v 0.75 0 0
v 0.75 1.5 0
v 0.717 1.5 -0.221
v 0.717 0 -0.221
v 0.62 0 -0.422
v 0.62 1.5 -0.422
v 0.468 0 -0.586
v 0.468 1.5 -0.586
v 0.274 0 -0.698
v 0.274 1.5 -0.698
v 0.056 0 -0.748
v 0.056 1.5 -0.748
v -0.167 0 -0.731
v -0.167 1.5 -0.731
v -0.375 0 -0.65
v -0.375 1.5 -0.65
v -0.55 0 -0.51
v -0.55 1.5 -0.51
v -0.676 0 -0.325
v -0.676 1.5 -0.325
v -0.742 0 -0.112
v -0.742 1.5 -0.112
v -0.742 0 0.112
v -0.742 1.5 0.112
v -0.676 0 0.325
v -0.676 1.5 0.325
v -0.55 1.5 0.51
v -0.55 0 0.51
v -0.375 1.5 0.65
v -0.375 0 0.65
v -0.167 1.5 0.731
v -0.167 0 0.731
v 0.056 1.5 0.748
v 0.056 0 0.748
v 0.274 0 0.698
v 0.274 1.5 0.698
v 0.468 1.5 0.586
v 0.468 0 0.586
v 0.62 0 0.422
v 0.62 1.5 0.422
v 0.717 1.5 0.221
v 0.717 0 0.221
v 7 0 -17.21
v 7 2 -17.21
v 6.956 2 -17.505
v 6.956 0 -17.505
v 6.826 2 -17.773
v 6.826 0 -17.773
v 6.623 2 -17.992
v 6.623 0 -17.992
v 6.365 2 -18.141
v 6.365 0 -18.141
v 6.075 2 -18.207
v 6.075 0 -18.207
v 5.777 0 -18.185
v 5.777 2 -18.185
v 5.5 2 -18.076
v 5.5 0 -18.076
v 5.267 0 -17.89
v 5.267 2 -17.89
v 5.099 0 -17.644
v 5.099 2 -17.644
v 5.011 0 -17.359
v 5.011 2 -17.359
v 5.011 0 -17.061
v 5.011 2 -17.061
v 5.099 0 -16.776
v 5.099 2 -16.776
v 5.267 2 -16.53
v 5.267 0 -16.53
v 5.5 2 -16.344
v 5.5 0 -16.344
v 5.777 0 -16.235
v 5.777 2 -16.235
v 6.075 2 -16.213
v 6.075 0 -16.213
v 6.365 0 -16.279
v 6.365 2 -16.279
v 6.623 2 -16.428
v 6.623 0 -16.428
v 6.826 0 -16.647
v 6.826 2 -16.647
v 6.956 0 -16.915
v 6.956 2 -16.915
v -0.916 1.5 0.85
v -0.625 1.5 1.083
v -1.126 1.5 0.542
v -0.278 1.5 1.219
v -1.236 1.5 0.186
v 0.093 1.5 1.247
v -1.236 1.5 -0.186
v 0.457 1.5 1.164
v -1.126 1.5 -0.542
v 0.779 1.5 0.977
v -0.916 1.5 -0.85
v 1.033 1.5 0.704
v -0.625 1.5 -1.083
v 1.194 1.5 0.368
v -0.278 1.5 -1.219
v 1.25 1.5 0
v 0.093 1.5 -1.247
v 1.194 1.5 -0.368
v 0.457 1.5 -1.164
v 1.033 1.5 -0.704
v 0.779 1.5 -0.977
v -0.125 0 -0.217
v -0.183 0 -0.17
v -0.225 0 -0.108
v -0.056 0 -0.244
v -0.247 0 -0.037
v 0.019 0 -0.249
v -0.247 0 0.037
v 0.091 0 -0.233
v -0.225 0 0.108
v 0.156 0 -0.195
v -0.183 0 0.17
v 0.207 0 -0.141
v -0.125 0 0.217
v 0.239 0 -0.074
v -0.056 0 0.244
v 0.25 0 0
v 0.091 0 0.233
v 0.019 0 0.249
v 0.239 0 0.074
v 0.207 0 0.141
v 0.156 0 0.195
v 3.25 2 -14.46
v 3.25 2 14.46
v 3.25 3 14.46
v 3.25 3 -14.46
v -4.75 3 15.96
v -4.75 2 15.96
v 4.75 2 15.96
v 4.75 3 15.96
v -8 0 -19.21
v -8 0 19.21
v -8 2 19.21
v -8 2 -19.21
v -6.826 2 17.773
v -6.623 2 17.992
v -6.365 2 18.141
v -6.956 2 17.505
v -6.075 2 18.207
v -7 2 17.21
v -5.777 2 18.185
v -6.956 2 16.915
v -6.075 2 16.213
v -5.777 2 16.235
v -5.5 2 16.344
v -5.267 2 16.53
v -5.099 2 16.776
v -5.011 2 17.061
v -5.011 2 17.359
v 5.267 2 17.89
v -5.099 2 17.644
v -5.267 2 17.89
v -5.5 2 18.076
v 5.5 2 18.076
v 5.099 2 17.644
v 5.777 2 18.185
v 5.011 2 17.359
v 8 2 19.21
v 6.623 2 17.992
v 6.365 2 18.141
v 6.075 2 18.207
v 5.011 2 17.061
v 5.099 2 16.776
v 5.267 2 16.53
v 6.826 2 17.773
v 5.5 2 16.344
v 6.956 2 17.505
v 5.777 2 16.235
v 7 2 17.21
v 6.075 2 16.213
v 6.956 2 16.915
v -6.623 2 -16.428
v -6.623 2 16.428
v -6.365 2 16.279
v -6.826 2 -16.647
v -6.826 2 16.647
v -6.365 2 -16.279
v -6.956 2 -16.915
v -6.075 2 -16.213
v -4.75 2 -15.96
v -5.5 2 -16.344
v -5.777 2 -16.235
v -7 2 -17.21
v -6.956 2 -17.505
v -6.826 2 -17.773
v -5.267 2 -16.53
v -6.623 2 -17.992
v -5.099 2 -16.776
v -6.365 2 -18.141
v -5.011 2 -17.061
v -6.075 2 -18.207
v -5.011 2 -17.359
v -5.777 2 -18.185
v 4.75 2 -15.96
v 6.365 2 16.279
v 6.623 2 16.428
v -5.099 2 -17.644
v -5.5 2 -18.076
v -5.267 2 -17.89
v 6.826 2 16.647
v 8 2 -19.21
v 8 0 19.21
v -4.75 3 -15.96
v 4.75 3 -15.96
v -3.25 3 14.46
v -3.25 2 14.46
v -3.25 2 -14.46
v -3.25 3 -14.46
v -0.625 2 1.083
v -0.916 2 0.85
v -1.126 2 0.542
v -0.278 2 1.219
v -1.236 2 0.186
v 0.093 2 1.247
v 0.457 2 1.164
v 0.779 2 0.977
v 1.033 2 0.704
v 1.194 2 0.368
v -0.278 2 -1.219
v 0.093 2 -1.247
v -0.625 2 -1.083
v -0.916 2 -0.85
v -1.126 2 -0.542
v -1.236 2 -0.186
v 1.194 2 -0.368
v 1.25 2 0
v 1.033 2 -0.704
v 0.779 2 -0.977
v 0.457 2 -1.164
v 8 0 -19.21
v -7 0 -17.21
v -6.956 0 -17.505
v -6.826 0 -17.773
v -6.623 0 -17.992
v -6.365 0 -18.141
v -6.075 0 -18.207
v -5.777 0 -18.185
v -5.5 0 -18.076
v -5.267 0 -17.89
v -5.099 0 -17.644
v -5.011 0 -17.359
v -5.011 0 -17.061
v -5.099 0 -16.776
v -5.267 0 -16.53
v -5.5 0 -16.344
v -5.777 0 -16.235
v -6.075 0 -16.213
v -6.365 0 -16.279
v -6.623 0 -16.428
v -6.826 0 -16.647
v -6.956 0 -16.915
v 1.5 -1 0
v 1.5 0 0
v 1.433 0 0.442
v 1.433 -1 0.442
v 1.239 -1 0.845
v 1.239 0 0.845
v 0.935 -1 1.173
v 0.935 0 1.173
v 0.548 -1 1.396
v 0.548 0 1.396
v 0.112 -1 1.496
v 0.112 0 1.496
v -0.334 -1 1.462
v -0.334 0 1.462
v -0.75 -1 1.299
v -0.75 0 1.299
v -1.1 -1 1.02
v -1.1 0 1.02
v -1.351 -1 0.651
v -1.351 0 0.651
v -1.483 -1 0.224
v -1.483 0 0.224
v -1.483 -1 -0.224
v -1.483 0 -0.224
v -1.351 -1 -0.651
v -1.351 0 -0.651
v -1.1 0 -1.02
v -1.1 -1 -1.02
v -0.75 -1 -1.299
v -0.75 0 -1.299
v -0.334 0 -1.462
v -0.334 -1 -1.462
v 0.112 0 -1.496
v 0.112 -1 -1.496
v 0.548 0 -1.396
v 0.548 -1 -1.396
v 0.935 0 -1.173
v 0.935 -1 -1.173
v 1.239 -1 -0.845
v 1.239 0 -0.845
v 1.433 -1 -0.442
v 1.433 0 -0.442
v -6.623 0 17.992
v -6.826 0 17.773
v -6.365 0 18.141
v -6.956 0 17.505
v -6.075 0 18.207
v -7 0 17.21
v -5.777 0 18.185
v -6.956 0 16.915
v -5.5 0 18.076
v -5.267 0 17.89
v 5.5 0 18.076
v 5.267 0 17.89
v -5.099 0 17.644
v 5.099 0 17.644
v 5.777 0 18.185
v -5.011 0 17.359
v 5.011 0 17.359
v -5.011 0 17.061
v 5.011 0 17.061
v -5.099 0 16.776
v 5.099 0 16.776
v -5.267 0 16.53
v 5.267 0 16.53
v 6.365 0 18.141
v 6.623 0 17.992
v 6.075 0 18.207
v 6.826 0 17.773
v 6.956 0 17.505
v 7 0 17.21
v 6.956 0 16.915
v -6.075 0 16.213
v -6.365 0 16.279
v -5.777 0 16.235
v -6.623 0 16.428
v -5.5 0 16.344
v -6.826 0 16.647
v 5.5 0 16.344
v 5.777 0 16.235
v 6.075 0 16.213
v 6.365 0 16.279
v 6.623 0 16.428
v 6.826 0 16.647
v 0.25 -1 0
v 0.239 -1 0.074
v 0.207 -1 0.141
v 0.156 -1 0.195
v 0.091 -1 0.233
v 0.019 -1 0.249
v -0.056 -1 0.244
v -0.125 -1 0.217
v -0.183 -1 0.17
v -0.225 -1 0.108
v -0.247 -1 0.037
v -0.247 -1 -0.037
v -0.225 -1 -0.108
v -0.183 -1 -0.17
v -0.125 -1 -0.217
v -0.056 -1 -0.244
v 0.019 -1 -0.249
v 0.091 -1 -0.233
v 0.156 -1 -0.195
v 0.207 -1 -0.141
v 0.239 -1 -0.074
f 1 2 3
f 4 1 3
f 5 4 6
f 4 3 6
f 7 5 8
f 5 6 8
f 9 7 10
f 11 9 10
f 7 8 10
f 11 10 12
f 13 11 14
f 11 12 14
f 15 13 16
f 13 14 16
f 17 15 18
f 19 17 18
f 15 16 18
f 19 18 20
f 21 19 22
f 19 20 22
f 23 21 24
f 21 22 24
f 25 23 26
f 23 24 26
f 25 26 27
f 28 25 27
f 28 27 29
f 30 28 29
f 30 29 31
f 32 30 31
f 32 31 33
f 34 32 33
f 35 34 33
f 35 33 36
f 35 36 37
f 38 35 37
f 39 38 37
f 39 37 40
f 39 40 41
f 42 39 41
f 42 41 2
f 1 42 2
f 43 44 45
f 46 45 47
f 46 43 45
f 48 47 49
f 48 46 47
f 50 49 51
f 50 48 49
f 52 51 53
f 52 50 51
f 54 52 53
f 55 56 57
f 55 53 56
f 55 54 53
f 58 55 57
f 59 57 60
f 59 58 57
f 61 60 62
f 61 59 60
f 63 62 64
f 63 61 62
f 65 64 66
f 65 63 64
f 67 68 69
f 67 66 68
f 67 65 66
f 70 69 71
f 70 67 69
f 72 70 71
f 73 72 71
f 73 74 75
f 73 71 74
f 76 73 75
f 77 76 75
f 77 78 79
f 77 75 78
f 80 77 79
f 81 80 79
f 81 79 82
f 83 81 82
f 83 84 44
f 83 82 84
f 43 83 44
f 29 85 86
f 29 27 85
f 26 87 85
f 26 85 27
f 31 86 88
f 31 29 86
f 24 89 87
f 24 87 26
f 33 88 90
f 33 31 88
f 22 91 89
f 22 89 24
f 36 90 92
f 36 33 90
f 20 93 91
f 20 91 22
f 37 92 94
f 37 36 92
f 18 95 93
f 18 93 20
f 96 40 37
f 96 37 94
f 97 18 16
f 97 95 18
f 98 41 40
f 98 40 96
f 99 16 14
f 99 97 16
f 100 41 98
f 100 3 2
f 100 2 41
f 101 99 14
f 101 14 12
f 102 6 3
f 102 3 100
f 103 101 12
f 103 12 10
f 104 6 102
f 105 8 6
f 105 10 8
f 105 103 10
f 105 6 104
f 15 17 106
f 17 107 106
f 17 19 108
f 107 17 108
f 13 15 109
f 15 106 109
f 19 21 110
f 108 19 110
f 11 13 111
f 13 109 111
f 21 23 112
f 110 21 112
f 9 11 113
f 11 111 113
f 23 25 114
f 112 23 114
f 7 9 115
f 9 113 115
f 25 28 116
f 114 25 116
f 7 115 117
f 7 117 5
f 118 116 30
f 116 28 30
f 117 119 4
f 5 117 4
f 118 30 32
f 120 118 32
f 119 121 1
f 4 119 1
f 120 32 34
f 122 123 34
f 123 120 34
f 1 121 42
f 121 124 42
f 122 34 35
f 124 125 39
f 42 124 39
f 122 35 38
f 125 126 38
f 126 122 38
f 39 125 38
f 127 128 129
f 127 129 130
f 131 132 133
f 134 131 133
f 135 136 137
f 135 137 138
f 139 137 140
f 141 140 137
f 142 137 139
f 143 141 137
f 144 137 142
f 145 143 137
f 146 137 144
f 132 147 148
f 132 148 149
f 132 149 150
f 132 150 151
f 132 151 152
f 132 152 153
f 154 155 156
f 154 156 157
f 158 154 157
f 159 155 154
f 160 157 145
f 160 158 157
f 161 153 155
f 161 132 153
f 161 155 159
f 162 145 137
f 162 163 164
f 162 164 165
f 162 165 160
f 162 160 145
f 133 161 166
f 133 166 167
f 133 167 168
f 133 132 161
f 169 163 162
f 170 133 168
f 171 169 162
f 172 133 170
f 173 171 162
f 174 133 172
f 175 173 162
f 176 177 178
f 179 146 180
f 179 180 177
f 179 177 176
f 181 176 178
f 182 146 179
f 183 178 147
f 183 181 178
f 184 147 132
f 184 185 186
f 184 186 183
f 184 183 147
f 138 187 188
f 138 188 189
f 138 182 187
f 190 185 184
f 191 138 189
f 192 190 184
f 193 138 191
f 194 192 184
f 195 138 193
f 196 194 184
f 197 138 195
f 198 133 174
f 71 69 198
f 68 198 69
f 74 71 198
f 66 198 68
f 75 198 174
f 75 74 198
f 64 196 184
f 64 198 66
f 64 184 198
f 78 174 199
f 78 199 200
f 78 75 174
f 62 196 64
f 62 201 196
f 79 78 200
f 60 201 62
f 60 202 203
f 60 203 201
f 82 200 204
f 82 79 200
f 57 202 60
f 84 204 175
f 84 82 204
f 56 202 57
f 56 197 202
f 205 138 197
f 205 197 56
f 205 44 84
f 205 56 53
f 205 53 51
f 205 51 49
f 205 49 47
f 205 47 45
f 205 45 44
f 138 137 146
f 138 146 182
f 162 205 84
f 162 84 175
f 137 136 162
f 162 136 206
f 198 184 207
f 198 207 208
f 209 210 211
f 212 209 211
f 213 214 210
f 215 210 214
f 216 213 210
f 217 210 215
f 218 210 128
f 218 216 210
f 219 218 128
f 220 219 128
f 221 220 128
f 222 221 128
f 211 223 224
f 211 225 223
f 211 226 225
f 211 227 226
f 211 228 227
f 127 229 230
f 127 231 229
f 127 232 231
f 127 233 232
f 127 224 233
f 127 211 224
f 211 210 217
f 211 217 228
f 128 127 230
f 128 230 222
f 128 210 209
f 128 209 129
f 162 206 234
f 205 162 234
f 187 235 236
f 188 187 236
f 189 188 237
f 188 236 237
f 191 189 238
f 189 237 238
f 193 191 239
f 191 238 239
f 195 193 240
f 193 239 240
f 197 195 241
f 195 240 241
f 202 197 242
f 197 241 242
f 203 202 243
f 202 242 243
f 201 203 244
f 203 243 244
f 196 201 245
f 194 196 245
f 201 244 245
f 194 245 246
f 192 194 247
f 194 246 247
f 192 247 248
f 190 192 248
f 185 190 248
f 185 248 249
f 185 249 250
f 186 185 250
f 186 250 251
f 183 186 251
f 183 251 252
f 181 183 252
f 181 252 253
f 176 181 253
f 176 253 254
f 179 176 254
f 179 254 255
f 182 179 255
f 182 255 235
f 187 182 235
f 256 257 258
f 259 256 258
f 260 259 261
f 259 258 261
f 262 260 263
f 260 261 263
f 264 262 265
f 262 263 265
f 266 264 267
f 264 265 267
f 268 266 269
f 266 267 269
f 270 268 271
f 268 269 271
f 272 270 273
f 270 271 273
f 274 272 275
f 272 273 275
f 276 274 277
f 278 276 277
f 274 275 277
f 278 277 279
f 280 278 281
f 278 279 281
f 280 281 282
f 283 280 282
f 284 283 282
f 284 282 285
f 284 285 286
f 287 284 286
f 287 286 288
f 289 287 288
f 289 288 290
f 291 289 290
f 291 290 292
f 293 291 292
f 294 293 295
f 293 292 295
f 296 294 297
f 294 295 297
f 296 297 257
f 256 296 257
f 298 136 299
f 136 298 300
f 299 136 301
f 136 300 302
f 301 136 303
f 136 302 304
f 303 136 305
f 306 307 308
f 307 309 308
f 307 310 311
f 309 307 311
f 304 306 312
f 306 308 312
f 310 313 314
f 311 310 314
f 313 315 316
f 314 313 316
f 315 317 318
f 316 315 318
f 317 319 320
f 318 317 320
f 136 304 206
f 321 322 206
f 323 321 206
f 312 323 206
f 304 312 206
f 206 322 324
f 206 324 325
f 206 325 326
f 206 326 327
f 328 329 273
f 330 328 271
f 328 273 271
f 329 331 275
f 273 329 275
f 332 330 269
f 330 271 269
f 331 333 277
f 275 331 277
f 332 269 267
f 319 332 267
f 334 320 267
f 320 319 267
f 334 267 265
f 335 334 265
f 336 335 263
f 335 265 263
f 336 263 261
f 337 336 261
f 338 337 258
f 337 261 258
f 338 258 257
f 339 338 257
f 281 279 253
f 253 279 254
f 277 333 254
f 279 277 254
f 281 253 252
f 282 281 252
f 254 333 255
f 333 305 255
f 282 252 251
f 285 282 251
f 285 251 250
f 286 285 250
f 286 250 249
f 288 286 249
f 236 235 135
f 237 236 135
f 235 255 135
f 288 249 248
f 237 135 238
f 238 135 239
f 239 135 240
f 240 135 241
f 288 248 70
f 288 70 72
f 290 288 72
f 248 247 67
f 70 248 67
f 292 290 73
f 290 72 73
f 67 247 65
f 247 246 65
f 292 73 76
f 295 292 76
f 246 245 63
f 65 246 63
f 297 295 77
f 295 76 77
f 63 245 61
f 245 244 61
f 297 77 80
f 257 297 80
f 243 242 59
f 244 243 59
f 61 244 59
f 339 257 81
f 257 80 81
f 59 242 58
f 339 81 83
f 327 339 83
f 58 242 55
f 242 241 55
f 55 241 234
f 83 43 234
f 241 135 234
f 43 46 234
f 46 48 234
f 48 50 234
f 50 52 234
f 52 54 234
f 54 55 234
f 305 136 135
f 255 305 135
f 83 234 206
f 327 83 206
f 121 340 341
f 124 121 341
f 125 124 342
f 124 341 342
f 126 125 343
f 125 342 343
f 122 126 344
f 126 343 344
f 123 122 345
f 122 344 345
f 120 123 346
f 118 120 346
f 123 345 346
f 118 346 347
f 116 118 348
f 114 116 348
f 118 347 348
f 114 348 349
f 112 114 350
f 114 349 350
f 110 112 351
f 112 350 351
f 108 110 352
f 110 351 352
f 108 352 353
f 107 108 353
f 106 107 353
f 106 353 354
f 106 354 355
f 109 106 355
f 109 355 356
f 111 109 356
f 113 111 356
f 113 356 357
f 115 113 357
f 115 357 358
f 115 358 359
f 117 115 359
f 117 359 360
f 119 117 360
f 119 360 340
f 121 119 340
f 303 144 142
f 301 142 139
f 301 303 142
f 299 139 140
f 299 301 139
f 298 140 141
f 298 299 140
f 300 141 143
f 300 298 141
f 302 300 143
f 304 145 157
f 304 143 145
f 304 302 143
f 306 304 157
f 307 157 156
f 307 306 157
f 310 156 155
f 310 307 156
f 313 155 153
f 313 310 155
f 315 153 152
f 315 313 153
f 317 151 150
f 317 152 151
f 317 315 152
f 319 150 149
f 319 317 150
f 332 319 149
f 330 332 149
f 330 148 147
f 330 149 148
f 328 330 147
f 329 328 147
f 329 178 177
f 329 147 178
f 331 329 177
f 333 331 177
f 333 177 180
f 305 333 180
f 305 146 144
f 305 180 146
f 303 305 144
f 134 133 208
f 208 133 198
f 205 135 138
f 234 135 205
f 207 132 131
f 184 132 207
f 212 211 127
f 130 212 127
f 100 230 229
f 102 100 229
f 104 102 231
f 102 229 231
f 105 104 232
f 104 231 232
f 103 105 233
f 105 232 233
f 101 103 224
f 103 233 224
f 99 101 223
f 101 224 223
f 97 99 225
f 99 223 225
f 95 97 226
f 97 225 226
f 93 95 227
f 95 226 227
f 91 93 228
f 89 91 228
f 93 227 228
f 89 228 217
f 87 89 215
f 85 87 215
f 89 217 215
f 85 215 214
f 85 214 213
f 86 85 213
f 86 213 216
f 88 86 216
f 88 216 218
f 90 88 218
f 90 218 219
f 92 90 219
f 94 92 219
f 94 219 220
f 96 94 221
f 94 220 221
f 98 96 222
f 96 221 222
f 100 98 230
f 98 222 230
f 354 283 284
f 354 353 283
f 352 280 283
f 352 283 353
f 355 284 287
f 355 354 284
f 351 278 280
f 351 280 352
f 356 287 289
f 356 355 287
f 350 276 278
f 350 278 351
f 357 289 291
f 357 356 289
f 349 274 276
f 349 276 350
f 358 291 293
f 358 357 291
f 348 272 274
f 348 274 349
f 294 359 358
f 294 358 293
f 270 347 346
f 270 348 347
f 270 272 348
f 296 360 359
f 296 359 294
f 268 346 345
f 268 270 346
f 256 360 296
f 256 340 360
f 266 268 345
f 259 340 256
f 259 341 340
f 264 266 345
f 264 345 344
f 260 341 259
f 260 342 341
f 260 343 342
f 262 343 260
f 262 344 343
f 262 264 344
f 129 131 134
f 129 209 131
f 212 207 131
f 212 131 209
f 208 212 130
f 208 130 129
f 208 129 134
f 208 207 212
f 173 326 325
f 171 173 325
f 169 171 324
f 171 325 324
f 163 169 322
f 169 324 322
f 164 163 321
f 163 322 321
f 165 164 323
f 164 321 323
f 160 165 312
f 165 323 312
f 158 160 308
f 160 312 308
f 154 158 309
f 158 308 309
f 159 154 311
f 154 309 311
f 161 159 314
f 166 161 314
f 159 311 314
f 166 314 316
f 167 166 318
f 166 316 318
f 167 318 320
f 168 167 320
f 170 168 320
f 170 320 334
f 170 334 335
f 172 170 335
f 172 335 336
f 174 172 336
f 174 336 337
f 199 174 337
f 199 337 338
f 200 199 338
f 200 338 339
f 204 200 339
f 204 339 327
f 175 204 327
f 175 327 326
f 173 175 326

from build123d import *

# Parameters (mm, degrees)
SKETCH1_W               = 16
SKETCH1_H               = 38.42
BOSS_EXTRUDE1_DEPTH     = 2
SKETCH2_W               = 9.5
SKETCH2_H               = 31.92
SKETCH2_W_2             = 6.5
SKETCH2_H_2             = 28.92
EXTRUDE_THIN1_DEPTH     = 1
SKETCH3_R               = 1
CUT_EXTRUDE1_DEPTH      = 4
MIRROR2_COPY_1_SKETCH_R = 1
MIRROR2_COPY_1_DEPTH    = 4
SKETCH5_R               = 0.75
CUT_EXTRUDE2_DEPTH      = 2
CUT_EXTRUDE2_DEPTH_BACK = 3
SKETCH6_R               = 1.25
CUT_EXTRUDE6_DEPTH      = 0.5
SKETCH7_R               = 1.5
BOSS_EXTRUDE2_DEPTH     = 1
SKETCH9_R               = 0.25
CUT_EXTRUDE7_DEPTH      = 2


with BuildPart() as part:
    # Sketch1 → Boss-Extrude1 (new body)
    with BuildSketch(Plane(origin=(0, 0, 0), x_dir=(1, 0, 0), z_dir=(0, 1, 0))):
        Rectangle(SKETCH1_W, SKETCH1_H)
    extrude(amount=BOSS_EXTRUDE1_DEPTH)

    # Sketch2 → Extrude-Thin1 (add)
    with BuildSketch(Plane(origin=(0, 2, 0), x_dir=(1, 0, 0), z_dir=(0, 1, 0))):
        Rectangle(SKETCH2_W, SKETCH2_H)
        Rectangle(SKETCH2_W_2, SKETCH2_H_2, mode=Mode.SUBTRACT)
    extrude(amount=EXTRUDE_THIN1_DEPTH)

    # Sketch3 → Cut-Extrude1 (cut, through all)
    with BuildSketch(Plane.XZ):
        with Locations((6, 17.21)):
            Circle(SKETCH3_R)
    cut_extrude1 = extrude(amount=-CUT_EXTRUDE1_DEPTH, mode=Mode.SUBTRACT)

    # Mirror1: Cut-Extrude1 across plane
    add(cut_extrude1.mirror(Plane(origin=(0, 0, 0), x_dir=(1, 0, 0), z_dir=(0, 0, -1))), mode=Mode.SUBTRACT)

    # Mirror2: Cut-Extrude1 across plane
    add(cut_extrude1.mirror(Plane.ZY), mode=Mode.SUBTRACT)

    # Mirror2 copy 1 sketch → Mirror2 copy 1 (cut, through all)
    with BuildSketch(Plane(origin=(0, 0, 0), x_dir=(-1, 0, 0), z_dir=(0, -1, 0))):
        with Locations((6, 17.21)):
            Circle(MIRROR2_COPY_1_SKETCH_R)
    extrude(amount=-MIRROR2_COPY_1_DEPTH, mode=Mode.SUBTRACT)

    # Sketch5 → Cut-Extrude2 (cut, two sides)
    with BuildSketch(Plane(origin=(0, 2, 0), x_dir=(1, 0, 0), z_dir=(0, 1, 0))) as cut_extrude2_sk:
        Circle(SKETCH5_R)
    extrude(amount=CUT_EXTRUDE2_DEPTH, mode=Mode.SUBTRACT)
    extrude(cut_extrude2_sk.sketch, amount=-CUT_EXTRUDE2_DEPTH_BACK, mode=Mode.SUBTRACT)

    # Sketch6 → Cut-Extrude6 (cut)
    with BuildSketch(Plane(origin=(0, 2, 0), x_dir=(1, 0, 0), z_dir=(0, 1, 0))):
        Circle(SKETCH6_R)
    extrude(amount=-CUT_EXTRUDE6_DEPTH, mode=Mode.SUBTRACT)

    # Sketch7 → Boss-Extrude2 (add)
    with BuildSketch(Plane.XZ):
        Circle(SKETCH7_R)
    extrude(amount=BOSS_EXTRUDE2_DEPTH)

    # Sketch9 → Cut-Extrude7 (cut)
    with BuildSketch(Plane.XZ.offset(1)):
        Circle(SKETCH9_R)
    extrude(amount=-CUT_EXTRUDE7_DEPTH, mode=Mode.SUBTRACT)


solid = part.part
